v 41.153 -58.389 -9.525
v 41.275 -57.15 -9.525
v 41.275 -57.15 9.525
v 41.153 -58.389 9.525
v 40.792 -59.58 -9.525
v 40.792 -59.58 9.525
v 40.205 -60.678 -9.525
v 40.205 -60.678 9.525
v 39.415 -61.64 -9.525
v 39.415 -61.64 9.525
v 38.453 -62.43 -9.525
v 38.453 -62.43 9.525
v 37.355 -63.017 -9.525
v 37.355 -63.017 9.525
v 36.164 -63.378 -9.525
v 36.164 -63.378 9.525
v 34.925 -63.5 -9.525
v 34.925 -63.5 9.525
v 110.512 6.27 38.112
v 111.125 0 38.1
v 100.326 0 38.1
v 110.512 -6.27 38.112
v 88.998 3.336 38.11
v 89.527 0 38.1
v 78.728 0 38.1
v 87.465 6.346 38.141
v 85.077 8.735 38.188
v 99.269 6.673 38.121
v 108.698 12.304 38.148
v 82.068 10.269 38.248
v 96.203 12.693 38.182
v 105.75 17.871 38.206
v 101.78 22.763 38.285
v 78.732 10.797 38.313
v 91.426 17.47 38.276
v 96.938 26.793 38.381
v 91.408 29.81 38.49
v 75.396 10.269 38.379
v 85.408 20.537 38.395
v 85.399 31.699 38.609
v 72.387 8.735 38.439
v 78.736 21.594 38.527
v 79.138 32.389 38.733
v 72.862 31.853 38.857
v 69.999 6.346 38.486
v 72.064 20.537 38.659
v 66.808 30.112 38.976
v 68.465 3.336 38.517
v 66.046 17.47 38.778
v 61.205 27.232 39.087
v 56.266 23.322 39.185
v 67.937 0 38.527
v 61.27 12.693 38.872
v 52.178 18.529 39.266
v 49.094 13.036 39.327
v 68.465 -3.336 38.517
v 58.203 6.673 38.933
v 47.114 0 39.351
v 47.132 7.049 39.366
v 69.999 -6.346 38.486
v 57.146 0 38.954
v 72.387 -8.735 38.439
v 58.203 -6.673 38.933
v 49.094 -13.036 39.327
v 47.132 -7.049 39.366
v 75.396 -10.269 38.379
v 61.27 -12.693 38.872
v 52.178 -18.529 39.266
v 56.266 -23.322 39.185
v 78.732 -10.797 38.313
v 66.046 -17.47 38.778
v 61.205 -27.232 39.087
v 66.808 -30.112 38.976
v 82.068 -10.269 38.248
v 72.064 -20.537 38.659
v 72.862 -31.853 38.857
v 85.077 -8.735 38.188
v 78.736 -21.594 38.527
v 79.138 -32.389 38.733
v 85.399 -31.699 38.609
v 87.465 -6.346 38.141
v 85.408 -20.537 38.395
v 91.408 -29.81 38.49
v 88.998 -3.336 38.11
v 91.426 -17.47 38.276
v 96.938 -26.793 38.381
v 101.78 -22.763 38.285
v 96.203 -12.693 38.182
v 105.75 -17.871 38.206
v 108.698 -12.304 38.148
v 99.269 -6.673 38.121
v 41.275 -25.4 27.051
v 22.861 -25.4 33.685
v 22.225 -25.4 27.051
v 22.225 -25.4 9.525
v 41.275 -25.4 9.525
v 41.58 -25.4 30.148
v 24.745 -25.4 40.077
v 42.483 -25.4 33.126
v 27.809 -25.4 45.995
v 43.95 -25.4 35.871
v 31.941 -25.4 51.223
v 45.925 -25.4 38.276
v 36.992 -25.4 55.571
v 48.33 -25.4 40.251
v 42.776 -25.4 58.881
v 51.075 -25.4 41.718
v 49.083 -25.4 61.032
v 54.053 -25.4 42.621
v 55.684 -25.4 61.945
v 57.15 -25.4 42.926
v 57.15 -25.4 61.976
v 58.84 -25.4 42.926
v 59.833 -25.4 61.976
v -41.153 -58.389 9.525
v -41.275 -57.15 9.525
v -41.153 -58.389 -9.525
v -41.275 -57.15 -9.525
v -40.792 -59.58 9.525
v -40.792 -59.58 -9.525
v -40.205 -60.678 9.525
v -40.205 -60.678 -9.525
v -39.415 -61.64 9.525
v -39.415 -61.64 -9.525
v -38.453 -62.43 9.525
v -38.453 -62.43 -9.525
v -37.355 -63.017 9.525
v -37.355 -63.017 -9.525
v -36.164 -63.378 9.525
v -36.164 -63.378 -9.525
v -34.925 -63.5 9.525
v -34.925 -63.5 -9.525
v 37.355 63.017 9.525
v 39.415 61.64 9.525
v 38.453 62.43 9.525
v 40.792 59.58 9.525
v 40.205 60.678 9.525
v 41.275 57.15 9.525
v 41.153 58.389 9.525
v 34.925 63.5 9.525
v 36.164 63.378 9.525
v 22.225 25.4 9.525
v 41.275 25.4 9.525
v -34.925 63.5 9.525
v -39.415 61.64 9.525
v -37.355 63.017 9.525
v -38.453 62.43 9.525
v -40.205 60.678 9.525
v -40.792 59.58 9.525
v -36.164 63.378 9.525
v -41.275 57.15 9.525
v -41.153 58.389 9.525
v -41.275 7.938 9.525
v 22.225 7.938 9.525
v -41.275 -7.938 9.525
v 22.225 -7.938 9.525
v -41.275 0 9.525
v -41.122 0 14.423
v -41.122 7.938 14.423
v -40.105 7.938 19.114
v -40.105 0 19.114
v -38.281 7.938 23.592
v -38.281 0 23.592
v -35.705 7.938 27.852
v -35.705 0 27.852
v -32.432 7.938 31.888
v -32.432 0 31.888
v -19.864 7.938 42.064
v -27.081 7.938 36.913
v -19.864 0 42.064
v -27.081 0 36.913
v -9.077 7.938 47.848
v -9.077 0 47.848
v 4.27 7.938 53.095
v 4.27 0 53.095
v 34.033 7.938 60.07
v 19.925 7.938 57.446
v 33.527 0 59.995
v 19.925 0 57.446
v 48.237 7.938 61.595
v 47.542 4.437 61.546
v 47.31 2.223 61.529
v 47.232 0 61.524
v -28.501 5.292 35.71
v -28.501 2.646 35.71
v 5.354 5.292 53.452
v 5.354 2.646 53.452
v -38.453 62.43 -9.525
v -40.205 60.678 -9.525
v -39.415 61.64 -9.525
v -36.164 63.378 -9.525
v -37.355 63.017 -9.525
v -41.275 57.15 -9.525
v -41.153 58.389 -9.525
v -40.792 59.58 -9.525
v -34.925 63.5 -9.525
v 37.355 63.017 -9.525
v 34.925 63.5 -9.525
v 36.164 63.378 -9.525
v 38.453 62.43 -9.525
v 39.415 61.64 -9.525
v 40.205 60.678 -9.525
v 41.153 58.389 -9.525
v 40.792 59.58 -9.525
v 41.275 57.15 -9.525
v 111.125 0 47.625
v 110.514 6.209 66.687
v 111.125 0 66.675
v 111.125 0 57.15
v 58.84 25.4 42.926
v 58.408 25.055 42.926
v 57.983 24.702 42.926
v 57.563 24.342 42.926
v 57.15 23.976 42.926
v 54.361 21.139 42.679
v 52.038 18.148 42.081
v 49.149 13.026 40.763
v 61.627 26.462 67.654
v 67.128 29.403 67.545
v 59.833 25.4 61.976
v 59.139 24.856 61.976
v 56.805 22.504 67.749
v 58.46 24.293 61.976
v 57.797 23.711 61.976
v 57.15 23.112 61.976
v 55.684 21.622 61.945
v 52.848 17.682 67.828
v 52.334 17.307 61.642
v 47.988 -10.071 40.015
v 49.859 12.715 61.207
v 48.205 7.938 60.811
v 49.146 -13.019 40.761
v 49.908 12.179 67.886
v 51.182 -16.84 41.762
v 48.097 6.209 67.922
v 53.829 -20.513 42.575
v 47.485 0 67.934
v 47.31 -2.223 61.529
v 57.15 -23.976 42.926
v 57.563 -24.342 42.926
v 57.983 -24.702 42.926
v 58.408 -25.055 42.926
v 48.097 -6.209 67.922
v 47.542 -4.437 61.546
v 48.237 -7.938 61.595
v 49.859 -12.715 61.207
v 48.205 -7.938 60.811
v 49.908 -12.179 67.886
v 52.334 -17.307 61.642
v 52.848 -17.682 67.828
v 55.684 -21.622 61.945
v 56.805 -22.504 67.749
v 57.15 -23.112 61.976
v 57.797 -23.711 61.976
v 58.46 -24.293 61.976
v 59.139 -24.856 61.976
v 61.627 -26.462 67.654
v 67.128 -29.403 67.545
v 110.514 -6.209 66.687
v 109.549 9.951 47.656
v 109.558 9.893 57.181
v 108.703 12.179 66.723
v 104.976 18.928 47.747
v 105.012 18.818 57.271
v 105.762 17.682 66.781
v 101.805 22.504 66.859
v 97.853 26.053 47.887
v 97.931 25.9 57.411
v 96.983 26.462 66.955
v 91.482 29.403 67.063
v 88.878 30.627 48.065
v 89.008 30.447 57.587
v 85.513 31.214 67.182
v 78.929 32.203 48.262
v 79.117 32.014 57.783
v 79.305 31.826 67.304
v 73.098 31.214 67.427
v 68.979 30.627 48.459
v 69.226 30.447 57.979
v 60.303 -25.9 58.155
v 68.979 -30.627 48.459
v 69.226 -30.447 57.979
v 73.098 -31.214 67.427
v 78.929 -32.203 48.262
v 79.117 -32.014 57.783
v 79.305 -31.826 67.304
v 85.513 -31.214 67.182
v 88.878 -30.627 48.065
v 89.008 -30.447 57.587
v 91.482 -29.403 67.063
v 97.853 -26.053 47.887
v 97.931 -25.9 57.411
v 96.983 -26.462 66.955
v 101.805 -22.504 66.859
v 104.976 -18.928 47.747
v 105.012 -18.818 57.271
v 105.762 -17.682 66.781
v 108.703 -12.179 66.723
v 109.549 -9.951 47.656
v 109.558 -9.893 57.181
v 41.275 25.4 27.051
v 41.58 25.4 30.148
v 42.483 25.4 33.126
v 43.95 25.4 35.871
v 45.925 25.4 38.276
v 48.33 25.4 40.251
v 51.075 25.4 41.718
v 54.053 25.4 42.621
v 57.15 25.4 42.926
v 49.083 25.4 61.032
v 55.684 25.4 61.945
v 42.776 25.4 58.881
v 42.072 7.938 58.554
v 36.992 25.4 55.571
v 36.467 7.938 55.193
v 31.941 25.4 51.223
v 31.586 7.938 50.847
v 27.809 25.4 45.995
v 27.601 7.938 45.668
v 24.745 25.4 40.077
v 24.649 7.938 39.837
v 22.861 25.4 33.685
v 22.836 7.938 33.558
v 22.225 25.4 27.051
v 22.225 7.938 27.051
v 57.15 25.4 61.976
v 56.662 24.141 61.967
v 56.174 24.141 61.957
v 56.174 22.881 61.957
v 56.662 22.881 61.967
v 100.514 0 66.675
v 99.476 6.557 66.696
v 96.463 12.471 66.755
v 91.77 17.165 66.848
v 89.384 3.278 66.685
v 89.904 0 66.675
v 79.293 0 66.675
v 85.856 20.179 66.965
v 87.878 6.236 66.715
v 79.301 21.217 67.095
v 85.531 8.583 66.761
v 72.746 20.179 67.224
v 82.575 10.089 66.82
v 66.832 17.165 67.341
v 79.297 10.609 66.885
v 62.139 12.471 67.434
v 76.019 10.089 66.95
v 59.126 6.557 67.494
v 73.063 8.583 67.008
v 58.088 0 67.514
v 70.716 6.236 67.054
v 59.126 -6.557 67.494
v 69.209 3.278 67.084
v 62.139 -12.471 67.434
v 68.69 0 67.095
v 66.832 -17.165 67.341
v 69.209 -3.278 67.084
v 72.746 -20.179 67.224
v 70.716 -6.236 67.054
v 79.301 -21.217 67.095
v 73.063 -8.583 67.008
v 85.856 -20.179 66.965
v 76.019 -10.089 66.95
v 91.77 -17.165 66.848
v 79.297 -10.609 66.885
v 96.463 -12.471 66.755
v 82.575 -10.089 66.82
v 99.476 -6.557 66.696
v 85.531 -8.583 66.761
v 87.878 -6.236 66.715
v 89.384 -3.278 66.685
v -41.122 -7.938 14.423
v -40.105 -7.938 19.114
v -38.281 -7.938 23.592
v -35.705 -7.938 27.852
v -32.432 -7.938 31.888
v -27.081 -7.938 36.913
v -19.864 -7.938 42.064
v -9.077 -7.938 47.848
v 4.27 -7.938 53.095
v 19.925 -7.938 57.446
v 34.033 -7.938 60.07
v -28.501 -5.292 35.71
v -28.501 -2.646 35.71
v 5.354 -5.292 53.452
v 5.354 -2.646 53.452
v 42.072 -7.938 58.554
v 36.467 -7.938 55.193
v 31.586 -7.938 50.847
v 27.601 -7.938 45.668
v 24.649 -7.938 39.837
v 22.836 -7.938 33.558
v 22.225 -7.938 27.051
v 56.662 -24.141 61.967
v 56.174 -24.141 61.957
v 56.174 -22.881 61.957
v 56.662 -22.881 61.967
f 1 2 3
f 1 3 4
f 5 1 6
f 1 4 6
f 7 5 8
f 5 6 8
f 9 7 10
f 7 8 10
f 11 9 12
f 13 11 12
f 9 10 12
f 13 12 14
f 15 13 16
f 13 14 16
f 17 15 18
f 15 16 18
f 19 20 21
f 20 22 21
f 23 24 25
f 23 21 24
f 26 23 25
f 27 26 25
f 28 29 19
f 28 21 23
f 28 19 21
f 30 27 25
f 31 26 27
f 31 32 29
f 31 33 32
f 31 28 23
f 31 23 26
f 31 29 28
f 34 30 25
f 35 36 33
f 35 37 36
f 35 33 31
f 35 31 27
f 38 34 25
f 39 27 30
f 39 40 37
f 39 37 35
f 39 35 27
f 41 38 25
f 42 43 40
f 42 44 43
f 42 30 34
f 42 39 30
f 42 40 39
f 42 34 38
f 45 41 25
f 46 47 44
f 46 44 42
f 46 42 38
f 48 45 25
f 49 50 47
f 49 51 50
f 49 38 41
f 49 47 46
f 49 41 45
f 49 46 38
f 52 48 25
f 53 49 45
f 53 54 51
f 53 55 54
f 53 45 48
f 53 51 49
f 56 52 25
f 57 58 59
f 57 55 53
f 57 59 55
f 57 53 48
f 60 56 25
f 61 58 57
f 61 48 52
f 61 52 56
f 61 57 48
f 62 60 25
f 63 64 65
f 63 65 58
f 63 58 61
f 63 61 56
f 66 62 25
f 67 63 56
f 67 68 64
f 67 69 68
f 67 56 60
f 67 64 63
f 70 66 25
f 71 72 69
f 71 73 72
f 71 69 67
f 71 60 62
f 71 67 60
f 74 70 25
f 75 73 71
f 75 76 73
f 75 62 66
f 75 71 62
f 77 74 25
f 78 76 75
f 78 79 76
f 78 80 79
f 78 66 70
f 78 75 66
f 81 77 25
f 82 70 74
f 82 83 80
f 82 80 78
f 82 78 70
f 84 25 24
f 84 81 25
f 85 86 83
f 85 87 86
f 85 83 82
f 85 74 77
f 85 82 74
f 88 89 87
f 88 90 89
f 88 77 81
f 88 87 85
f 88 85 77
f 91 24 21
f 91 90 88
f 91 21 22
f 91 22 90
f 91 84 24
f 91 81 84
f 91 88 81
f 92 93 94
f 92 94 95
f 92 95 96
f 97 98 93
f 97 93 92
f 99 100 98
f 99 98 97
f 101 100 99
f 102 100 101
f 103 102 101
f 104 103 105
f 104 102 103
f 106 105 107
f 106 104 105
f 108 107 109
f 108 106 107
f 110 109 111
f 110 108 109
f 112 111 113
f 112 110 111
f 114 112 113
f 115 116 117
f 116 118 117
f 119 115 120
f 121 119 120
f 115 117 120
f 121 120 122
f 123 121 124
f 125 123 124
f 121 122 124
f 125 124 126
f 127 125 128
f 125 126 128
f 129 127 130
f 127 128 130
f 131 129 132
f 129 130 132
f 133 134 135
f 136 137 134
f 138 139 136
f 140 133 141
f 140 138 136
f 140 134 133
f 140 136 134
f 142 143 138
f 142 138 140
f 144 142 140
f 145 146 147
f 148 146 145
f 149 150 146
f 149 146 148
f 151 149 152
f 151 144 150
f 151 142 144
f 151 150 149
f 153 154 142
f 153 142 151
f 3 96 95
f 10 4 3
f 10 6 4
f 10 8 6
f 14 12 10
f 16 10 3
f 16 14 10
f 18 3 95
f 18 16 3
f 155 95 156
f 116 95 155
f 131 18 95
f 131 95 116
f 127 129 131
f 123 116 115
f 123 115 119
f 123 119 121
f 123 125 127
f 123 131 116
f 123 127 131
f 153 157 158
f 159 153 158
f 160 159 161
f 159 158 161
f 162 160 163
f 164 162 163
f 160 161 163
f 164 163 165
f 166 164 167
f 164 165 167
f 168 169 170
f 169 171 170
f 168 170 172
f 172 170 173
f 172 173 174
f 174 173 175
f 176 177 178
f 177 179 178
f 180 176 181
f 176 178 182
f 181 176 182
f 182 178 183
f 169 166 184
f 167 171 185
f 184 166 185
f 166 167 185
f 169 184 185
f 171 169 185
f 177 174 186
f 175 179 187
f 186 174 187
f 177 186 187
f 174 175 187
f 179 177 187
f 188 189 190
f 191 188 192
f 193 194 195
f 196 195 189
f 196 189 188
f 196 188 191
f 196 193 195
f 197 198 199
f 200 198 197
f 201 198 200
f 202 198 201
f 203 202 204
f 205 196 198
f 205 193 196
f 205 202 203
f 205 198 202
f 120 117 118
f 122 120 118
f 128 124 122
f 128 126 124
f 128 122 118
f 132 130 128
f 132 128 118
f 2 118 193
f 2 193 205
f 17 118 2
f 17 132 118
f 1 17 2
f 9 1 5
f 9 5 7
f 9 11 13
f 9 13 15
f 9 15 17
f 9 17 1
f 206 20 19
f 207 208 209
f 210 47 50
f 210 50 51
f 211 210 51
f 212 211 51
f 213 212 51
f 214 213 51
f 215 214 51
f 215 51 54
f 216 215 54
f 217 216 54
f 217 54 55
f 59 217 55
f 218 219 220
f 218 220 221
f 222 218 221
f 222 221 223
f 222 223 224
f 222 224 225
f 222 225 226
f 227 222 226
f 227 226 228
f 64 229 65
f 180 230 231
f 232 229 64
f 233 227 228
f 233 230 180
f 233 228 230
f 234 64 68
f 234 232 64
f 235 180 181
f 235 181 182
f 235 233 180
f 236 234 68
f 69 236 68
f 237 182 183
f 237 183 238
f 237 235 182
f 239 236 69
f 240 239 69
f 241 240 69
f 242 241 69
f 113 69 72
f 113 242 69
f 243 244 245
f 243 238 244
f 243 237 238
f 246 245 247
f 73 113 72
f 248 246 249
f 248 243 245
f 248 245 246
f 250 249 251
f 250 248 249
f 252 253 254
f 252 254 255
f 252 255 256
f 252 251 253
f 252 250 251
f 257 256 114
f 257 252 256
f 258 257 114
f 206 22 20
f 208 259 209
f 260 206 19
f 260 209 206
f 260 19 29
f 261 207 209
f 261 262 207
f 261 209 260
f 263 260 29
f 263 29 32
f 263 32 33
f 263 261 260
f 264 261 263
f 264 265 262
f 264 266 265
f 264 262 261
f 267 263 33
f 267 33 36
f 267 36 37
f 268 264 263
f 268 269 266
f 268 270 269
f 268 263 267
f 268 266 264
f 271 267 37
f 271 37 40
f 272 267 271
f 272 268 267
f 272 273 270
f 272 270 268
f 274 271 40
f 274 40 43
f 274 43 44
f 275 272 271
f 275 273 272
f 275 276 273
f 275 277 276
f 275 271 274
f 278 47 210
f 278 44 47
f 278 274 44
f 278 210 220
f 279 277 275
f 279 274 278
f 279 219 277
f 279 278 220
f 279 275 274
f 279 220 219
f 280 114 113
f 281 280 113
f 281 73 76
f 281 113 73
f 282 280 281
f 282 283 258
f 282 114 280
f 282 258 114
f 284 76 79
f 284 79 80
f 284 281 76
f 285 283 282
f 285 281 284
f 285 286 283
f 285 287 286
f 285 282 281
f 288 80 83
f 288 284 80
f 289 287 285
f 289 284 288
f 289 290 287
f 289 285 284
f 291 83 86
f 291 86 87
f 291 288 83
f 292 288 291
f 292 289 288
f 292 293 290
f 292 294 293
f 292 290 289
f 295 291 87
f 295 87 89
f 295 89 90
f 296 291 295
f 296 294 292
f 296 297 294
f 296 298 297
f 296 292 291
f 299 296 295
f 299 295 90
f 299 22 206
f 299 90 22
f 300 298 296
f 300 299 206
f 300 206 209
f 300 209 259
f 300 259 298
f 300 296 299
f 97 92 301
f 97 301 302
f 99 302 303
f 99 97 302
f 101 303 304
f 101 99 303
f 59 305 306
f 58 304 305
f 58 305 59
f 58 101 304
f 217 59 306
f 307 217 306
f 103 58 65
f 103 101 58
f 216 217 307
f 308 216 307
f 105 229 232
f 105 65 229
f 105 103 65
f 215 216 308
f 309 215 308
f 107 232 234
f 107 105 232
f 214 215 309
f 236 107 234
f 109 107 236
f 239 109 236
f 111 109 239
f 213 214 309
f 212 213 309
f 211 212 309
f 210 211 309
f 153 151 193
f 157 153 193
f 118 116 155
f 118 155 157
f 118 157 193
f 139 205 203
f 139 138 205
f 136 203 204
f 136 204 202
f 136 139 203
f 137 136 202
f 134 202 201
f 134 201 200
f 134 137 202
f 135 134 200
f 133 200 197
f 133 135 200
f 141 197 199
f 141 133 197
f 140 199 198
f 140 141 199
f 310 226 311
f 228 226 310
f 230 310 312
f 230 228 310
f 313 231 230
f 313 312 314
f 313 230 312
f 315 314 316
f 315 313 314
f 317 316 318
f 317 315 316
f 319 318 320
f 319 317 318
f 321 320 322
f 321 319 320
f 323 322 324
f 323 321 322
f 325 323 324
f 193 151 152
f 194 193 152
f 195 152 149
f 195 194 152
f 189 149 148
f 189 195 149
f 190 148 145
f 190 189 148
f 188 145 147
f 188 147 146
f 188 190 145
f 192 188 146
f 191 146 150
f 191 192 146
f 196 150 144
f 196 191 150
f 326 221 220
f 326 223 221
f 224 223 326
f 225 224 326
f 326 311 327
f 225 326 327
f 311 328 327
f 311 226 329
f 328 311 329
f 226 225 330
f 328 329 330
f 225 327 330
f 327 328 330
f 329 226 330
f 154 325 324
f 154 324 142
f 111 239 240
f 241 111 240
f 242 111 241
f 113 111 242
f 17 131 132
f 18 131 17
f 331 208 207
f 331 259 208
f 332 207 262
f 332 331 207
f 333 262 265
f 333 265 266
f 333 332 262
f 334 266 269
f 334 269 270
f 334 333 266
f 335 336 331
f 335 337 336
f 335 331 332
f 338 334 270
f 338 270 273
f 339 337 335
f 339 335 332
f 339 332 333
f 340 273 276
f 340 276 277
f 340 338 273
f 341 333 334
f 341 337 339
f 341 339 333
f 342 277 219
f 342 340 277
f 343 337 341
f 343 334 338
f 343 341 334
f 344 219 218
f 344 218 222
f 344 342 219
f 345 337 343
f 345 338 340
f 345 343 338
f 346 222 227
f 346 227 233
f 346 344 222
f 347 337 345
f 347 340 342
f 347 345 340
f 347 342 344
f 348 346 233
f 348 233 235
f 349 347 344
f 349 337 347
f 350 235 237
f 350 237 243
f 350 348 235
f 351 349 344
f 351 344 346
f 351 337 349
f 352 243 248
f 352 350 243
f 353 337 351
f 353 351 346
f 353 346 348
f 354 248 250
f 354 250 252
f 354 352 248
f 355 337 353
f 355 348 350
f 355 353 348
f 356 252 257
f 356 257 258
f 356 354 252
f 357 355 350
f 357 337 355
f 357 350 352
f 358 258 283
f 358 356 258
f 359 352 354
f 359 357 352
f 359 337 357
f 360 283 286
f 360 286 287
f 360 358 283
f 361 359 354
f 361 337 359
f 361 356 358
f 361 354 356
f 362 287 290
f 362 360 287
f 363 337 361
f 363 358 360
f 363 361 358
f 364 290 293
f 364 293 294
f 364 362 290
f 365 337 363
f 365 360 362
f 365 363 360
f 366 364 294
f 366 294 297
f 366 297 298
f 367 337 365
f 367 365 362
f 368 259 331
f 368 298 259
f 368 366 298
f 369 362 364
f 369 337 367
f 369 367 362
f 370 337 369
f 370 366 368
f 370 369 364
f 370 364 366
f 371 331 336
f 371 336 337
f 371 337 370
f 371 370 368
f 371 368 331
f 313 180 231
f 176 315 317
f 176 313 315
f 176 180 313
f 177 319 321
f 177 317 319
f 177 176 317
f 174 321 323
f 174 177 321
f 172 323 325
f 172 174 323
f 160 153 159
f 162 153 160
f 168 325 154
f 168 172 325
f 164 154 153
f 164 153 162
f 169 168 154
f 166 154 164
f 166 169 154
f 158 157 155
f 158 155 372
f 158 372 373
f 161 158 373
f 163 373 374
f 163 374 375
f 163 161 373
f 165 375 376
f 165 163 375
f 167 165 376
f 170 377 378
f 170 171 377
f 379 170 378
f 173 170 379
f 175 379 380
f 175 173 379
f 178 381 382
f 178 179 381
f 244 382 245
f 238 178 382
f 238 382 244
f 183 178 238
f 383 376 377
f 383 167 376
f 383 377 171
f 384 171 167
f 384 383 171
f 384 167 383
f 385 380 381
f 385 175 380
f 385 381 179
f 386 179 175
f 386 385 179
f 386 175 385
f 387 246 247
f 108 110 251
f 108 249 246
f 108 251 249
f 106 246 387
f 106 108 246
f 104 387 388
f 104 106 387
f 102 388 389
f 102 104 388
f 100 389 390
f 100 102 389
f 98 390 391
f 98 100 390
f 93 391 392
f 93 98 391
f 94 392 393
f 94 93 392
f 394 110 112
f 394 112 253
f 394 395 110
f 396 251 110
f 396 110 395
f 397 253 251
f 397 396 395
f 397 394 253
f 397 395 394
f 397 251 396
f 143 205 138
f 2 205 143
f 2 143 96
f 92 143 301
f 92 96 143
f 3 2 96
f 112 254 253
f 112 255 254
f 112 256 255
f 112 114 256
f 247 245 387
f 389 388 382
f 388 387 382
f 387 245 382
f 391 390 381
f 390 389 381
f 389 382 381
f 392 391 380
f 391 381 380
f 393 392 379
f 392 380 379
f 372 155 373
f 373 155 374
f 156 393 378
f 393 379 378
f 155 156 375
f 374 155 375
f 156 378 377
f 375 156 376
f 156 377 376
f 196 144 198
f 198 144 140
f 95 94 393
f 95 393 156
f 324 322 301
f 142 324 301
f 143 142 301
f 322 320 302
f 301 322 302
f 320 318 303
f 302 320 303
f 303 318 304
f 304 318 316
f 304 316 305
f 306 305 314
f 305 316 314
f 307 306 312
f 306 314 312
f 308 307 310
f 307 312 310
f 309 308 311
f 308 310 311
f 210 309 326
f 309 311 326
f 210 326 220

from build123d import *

# Parameters (mm, degrees)
F1_DEPTH = 63.5
F2_DEPTH = 25.4
F3_DEPTH = 7.9375
F4_DEPTH = 25.4
F6_R     = 6.35


# Not quite as in the source:
# - a feature names something its author has since deleted; it is built from what else it names


with BuildPart() as f1:
    # F0 (on Front) → F1 (new body, symmetric)
    with BuildSketch(Plane.XZ):
        Polygon((22.225, 9.525), (-41.275, 9.525), (-41.275, -9.525), (41.275, -9.525), (41.275, 9.525), align=None)
    extrude(amount=F1_DEPTH, both=True)

    # F0 (on Front) → F2 (join, symmetric)
    with BuildSketch(Plane.XZ):
        with BuildLine():
            Line((22.225, 27.051), (22.225, 9.525))
            Line((22.225, 9.525), (41.275, 9.525))
            Line((41.275, 9.525), (41.275, 27.051))
            ThreePointArc((41.275, 27.051), (45.9246798487, 38.2763201513), (57.15, 42.926))
            Line((57.15, 42.926), (60.325, 42.926))
            Line((60.325, 42.926), (60.325, 61.976))
            Line((60.325, 61.976), (57.15, 61.976))
            add(Edge.make_bspline(
                [(55.6844107211, 61.9452355277), (56.1739766533, 61.9576548863), (56.6625337097, 61.9679123237), (57.15, 61.976)],
                knots=[110.3317061333, 110.3317061333, 110.3317061333, 110.3317061333, 111.5284180198, 111.5284180198, 111.5284180198, 111.5284180198], degree=3))
            ThreePointArc((55.6844107211, 61.9452355277), (31.9414565021, 51.2229870866), (22.225, 27.051))
        make_face()
    extrude(amount=F2_DEPTH, both=True)

    # F0 (on Front) → F3 (join, symmetric)
    with BuildSketch(Plane.XZ):
        with BuildLine():
            add(Edge.make_bspline(
                [(-41.275, 9.525), (-43.1628450735, 41.2787763348), (10.5485303307, 60.8002239091), (55.6844107211, 61.9452355277)],
                knots=[0, 0, 0, 0, 110.3317061333, 110.3317061333, 110.3317061333, 110.3317061333], degree=3))
            Line((-41.275, 9.525), (22.225, 9.525))
            Line((22.225, 9.525), (22.225, 27.051))
            ThreePointArc((22.225, 27.051), (31.9414565021, 51.2229870866), (55.6844107211, 61.9452355277))
        make_face()
    extrude(amount=F3_DEPTH, both=True)

    # F0 (on Front) → F4 (join, symmetric)
    with BuildSketch(Plane.XZ):
        Polygon((79.1998635302, 61.976), (60.325, 61.976), (60.325, 42.926), (78.823101495, 42.926), align=None)
    extrude(amount=F4_DEPTH, both=True)

    # F0 (on Front) → F5 (revolve)
    with BuildSketch(Plane.XZ):
        Polygon((79.2927981655, 66.675), (79.1998635302, 61.976), (78.823101495, 42.926), (78.7276551127, 38.1), (111.125, 38.1), (111.125, 66.675), align=None)
    revolve(axis=Axis((79.0102266391, 0, 52.3875), (0.0197736678, 0, 0.9998044819)))

    # F6
    f6_edges = [f1.edges().sort_by_distance(p)[0] for p in [
        (41.275, -63.5, 0),
        (-41.275, -63.5, 0),
        (-41.275, 63.5, 0),
        (41.275, 63.5, 0),
    ]]
    fillet(f6_edges, radius=F6_R)


solid = f1.part
